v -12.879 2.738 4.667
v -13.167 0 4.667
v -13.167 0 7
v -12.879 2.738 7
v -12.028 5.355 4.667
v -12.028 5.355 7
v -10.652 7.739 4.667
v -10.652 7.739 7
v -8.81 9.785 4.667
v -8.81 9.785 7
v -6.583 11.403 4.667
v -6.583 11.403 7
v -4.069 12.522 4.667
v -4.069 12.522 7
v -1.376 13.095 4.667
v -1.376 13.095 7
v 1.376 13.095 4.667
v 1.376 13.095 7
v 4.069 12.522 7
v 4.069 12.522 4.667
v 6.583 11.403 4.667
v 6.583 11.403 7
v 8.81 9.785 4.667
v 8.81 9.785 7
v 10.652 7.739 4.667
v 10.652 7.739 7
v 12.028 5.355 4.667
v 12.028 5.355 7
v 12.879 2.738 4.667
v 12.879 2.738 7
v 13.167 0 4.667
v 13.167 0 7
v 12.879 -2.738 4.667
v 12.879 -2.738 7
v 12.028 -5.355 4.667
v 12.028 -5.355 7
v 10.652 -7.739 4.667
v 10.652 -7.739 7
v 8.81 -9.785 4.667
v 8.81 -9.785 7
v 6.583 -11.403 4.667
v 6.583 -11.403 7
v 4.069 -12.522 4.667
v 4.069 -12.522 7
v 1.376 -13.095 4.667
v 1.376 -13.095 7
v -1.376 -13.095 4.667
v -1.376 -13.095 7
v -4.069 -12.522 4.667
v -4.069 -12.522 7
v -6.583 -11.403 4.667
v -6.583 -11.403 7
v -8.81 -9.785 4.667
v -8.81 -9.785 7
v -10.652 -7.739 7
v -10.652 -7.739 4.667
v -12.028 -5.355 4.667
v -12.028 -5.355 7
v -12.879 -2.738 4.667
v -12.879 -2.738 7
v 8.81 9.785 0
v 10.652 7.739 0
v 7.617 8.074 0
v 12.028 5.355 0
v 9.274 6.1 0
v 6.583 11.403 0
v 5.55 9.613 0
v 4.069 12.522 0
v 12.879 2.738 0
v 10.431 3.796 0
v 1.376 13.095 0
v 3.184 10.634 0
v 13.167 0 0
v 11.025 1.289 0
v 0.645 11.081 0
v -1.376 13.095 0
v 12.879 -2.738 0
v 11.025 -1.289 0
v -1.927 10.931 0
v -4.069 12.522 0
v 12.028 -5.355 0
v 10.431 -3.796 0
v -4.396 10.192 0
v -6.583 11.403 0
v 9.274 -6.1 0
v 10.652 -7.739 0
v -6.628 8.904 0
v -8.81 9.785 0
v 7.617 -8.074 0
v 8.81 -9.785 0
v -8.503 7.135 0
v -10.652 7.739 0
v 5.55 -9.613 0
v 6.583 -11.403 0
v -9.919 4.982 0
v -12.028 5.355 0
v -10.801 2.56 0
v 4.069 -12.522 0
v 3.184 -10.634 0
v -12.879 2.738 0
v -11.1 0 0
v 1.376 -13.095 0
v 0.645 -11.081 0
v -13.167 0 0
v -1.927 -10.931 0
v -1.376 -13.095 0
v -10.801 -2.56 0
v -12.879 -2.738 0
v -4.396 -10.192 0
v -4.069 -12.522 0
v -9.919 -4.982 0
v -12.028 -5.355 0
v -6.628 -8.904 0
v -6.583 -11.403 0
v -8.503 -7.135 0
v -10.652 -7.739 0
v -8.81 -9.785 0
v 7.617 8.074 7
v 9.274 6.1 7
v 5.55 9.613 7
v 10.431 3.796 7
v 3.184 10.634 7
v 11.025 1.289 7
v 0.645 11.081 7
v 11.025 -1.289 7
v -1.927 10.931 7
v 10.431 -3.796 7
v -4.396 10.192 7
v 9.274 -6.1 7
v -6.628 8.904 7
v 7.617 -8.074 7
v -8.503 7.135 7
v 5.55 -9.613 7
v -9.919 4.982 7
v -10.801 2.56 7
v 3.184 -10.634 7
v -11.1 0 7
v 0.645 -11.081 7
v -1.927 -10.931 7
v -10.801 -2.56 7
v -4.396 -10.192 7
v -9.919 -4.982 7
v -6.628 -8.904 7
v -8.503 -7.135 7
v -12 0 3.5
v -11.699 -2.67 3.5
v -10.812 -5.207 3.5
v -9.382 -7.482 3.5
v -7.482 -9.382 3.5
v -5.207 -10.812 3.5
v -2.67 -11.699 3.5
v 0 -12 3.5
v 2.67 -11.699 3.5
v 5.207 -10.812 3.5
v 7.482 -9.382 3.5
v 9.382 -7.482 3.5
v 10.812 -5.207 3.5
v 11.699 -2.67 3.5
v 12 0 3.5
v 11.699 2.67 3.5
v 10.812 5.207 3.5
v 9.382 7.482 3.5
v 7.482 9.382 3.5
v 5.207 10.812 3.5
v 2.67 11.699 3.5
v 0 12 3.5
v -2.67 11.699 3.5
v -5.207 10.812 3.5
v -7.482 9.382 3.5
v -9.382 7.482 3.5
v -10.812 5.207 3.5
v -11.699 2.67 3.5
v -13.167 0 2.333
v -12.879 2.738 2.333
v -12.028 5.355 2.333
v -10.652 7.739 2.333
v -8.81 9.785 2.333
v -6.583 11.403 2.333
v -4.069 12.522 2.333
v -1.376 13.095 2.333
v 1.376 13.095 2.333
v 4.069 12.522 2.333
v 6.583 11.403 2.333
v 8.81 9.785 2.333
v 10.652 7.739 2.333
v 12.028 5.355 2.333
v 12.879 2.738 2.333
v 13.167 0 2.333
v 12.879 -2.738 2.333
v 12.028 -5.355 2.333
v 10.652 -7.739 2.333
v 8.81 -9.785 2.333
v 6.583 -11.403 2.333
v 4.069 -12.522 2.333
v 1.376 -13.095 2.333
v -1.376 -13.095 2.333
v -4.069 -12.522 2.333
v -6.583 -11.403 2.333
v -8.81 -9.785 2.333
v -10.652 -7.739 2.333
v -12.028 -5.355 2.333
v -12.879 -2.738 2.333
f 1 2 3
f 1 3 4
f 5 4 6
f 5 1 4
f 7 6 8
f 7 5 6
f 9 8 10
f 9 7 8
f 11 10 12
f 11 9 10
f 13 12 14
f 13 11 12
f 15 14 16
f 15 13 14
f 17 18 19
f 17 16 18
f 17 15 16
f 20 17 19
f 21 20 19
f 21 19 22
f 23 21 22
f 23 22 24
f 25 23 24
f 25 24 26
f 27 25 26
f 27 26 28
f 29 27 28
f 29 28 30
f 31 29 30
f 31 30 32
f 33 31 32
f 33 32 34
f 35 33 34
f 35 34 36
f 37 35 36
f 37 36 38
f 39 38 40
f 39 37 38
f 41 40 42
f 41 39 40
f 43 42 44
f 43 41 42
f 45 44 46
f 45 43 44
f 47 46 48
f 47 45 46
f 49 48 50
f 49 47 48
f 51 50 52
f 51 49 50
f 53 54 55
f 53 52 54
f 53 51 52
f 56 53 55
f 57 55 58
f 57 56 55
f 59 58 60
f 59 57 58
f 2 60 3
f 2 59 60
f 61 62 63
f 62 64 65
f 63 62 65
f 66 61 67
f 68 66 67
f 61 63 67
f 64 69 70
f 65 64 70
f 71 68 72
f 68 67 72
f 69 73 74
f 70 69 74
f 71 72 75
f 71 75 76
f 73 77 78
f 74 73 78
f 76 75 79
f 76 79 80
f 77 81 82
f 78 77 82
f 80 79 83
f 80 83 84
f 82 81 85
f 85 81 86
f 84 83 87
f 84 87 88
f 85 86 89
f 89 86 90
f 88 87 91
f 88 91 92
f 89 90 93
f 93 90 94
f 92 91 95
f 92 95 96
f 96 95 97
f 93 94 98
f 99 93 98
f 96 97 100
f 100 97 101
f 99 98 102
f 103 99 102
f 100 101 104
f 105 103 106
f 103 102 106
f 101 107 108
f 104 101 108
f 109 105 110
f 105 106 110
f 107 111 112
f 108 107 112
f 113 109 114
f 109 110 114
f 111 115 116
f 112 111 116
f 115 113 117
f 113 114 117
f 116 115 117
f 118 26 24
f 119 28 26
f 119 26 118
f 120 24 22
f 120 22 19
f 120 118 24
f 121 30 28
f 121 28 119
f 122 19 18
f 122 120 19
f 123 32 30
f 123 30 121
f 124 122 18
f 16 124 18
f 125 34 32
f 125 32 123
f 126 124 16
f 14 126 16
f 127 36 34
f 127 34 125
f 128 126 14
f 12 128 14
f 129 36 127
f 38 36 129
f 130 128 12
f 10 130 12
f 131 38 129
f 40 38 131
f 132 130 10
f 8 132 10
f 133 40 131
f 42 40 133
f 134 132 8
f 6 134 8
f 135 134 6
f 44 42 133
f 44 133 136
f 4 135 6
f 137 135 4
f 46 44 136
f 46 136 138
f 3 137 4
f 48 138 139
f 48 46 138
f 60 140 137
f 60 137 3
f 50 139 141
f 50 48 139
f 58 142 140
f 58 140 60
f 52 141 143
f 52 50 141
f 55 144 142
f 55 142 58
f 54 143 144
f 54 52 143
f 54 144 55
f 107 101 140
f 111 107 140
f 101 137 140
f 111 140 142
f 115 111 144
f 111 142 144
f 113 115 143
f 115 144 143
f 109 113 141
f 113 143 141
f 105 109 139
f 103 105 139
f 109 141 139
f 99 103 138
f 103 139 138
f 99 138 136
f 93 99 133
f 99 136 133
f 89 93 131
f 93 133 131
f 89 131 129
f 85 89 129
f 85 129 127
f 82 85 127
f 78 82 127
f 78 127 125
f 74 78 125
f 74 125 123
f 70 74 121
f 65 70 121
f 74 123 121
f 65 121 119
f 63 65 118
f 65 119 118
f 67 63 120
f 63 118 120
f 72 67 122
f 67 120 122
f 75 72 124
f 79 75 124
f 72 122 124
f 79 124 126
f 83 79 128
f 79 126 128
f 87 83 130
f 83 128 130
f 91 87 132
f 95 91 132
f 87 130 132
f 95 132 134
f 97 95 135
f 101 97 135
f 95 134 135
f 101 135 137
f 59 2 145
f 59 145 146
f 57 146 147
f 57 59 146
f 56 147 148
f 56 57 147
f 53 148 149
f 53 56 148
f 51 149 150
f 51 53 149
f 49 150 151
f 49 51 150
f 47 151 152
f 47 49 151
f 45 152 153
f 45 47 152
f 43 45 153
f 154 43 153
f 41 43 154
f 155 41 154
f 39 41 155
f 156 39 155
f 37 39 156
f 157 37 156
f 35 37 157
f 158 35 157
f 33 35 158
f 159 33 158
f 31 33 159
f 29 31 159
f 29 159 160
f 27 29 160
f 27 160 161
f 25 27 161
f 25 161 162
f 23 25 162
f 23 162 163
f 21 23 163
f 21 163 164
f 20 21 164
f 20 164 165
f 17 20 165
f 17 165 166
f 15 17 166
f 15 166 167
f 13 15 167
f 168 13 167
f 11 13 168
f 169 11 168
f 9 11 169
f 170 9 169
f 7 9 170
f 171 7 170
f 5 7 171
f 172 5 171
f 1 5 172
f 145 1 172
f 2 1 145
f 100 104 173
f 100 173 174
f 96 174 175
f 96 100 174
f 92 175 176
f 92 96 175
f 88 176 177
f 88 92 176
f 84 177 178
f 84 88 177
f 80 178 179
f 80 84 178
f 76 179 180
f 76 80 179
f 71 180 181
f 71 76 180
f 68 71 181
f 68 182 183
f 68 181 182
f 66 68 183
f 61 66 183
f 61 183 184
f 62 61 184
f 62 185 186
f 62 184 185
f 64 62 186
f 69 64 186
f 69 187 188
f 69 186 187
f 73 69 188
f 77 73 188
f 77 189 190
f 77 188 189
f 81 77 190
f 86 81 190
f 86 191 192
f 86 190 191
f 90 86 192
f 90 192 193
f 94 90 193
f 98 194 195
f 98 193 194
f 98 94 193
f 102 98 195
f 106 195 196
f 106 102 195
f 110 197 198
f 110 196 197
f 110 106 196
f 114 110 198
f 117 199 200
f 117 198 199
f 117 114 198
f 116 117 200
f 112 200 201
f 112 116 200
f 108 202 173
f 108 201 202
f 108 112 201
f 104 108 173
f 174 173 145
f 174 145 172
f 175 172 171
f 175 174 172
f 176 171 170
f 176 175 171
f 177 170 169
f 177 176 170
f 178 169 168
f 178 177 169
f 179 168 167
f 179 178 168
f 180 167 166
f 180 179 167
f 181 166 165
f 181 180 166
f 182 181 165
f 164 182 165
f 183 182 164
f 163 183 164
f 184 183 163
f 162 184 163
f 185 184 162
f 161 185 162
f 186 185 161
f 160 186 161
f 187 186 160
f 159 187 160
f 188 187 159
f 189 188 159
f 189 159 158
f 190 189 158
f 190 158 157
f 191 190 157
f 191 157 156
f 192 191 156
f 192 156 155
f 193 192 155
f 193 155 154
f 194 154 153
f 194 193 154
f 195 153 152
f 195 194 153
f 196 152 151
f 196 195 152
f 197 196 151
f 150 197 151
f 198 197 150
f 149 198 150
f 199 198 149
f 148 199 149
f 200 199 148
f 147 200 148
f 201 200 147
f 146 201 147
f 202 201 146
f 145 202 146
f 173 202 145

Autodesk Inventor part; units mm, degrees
ref_plane "YZ Plane" through (0, 0, 0) normal (1, 0, 0) x (0, 1, 0)
ref_plane "XZ Plane" through (0, 0, 0) normal (0, 1, 0) x (-1, 0, 0)
ref_plane "XY Plane" through (0, 0, 0) normal (0, 0, 1) x (1, 0, 0)
sketch "Sketch1" plane through (0, 0, 0) normal (0, 1, 0) x (-1, 0, 0)
  line L0 (11.1, 0) -> (11.1, 7)
  line L1 (11.1, 7) -> (13.1667, 7)
  line L2 (13.1667, 7) -> (13.1667, 4.6667)
  line L3 (13.1667, 4.6667) -> (12, 3.5)
  line L4 (12, 3.5) -> (13.1667, 2.3333)
  line L5 (13.1667, 2.3333) -> (13.1667, 0)
  line L6 (13.1667, 0) -> (11.1, 0)
  line L7 (0, 0) -> (0, 4.5986)
  line L8 (13.1667, 4.6667) -> (13.1667, 2.3333)
  dimension "d0" = 11.1
  dimension "d3" = 7
  dimension "d4" = 12
revolve "Revolution1" add sketch "Sketch1" angle 360 about axis through (0, 0, 0) along (0, 0, 1) contours L0 L1 L2 L3 L4 L5 L6
properties part number "z idler"
